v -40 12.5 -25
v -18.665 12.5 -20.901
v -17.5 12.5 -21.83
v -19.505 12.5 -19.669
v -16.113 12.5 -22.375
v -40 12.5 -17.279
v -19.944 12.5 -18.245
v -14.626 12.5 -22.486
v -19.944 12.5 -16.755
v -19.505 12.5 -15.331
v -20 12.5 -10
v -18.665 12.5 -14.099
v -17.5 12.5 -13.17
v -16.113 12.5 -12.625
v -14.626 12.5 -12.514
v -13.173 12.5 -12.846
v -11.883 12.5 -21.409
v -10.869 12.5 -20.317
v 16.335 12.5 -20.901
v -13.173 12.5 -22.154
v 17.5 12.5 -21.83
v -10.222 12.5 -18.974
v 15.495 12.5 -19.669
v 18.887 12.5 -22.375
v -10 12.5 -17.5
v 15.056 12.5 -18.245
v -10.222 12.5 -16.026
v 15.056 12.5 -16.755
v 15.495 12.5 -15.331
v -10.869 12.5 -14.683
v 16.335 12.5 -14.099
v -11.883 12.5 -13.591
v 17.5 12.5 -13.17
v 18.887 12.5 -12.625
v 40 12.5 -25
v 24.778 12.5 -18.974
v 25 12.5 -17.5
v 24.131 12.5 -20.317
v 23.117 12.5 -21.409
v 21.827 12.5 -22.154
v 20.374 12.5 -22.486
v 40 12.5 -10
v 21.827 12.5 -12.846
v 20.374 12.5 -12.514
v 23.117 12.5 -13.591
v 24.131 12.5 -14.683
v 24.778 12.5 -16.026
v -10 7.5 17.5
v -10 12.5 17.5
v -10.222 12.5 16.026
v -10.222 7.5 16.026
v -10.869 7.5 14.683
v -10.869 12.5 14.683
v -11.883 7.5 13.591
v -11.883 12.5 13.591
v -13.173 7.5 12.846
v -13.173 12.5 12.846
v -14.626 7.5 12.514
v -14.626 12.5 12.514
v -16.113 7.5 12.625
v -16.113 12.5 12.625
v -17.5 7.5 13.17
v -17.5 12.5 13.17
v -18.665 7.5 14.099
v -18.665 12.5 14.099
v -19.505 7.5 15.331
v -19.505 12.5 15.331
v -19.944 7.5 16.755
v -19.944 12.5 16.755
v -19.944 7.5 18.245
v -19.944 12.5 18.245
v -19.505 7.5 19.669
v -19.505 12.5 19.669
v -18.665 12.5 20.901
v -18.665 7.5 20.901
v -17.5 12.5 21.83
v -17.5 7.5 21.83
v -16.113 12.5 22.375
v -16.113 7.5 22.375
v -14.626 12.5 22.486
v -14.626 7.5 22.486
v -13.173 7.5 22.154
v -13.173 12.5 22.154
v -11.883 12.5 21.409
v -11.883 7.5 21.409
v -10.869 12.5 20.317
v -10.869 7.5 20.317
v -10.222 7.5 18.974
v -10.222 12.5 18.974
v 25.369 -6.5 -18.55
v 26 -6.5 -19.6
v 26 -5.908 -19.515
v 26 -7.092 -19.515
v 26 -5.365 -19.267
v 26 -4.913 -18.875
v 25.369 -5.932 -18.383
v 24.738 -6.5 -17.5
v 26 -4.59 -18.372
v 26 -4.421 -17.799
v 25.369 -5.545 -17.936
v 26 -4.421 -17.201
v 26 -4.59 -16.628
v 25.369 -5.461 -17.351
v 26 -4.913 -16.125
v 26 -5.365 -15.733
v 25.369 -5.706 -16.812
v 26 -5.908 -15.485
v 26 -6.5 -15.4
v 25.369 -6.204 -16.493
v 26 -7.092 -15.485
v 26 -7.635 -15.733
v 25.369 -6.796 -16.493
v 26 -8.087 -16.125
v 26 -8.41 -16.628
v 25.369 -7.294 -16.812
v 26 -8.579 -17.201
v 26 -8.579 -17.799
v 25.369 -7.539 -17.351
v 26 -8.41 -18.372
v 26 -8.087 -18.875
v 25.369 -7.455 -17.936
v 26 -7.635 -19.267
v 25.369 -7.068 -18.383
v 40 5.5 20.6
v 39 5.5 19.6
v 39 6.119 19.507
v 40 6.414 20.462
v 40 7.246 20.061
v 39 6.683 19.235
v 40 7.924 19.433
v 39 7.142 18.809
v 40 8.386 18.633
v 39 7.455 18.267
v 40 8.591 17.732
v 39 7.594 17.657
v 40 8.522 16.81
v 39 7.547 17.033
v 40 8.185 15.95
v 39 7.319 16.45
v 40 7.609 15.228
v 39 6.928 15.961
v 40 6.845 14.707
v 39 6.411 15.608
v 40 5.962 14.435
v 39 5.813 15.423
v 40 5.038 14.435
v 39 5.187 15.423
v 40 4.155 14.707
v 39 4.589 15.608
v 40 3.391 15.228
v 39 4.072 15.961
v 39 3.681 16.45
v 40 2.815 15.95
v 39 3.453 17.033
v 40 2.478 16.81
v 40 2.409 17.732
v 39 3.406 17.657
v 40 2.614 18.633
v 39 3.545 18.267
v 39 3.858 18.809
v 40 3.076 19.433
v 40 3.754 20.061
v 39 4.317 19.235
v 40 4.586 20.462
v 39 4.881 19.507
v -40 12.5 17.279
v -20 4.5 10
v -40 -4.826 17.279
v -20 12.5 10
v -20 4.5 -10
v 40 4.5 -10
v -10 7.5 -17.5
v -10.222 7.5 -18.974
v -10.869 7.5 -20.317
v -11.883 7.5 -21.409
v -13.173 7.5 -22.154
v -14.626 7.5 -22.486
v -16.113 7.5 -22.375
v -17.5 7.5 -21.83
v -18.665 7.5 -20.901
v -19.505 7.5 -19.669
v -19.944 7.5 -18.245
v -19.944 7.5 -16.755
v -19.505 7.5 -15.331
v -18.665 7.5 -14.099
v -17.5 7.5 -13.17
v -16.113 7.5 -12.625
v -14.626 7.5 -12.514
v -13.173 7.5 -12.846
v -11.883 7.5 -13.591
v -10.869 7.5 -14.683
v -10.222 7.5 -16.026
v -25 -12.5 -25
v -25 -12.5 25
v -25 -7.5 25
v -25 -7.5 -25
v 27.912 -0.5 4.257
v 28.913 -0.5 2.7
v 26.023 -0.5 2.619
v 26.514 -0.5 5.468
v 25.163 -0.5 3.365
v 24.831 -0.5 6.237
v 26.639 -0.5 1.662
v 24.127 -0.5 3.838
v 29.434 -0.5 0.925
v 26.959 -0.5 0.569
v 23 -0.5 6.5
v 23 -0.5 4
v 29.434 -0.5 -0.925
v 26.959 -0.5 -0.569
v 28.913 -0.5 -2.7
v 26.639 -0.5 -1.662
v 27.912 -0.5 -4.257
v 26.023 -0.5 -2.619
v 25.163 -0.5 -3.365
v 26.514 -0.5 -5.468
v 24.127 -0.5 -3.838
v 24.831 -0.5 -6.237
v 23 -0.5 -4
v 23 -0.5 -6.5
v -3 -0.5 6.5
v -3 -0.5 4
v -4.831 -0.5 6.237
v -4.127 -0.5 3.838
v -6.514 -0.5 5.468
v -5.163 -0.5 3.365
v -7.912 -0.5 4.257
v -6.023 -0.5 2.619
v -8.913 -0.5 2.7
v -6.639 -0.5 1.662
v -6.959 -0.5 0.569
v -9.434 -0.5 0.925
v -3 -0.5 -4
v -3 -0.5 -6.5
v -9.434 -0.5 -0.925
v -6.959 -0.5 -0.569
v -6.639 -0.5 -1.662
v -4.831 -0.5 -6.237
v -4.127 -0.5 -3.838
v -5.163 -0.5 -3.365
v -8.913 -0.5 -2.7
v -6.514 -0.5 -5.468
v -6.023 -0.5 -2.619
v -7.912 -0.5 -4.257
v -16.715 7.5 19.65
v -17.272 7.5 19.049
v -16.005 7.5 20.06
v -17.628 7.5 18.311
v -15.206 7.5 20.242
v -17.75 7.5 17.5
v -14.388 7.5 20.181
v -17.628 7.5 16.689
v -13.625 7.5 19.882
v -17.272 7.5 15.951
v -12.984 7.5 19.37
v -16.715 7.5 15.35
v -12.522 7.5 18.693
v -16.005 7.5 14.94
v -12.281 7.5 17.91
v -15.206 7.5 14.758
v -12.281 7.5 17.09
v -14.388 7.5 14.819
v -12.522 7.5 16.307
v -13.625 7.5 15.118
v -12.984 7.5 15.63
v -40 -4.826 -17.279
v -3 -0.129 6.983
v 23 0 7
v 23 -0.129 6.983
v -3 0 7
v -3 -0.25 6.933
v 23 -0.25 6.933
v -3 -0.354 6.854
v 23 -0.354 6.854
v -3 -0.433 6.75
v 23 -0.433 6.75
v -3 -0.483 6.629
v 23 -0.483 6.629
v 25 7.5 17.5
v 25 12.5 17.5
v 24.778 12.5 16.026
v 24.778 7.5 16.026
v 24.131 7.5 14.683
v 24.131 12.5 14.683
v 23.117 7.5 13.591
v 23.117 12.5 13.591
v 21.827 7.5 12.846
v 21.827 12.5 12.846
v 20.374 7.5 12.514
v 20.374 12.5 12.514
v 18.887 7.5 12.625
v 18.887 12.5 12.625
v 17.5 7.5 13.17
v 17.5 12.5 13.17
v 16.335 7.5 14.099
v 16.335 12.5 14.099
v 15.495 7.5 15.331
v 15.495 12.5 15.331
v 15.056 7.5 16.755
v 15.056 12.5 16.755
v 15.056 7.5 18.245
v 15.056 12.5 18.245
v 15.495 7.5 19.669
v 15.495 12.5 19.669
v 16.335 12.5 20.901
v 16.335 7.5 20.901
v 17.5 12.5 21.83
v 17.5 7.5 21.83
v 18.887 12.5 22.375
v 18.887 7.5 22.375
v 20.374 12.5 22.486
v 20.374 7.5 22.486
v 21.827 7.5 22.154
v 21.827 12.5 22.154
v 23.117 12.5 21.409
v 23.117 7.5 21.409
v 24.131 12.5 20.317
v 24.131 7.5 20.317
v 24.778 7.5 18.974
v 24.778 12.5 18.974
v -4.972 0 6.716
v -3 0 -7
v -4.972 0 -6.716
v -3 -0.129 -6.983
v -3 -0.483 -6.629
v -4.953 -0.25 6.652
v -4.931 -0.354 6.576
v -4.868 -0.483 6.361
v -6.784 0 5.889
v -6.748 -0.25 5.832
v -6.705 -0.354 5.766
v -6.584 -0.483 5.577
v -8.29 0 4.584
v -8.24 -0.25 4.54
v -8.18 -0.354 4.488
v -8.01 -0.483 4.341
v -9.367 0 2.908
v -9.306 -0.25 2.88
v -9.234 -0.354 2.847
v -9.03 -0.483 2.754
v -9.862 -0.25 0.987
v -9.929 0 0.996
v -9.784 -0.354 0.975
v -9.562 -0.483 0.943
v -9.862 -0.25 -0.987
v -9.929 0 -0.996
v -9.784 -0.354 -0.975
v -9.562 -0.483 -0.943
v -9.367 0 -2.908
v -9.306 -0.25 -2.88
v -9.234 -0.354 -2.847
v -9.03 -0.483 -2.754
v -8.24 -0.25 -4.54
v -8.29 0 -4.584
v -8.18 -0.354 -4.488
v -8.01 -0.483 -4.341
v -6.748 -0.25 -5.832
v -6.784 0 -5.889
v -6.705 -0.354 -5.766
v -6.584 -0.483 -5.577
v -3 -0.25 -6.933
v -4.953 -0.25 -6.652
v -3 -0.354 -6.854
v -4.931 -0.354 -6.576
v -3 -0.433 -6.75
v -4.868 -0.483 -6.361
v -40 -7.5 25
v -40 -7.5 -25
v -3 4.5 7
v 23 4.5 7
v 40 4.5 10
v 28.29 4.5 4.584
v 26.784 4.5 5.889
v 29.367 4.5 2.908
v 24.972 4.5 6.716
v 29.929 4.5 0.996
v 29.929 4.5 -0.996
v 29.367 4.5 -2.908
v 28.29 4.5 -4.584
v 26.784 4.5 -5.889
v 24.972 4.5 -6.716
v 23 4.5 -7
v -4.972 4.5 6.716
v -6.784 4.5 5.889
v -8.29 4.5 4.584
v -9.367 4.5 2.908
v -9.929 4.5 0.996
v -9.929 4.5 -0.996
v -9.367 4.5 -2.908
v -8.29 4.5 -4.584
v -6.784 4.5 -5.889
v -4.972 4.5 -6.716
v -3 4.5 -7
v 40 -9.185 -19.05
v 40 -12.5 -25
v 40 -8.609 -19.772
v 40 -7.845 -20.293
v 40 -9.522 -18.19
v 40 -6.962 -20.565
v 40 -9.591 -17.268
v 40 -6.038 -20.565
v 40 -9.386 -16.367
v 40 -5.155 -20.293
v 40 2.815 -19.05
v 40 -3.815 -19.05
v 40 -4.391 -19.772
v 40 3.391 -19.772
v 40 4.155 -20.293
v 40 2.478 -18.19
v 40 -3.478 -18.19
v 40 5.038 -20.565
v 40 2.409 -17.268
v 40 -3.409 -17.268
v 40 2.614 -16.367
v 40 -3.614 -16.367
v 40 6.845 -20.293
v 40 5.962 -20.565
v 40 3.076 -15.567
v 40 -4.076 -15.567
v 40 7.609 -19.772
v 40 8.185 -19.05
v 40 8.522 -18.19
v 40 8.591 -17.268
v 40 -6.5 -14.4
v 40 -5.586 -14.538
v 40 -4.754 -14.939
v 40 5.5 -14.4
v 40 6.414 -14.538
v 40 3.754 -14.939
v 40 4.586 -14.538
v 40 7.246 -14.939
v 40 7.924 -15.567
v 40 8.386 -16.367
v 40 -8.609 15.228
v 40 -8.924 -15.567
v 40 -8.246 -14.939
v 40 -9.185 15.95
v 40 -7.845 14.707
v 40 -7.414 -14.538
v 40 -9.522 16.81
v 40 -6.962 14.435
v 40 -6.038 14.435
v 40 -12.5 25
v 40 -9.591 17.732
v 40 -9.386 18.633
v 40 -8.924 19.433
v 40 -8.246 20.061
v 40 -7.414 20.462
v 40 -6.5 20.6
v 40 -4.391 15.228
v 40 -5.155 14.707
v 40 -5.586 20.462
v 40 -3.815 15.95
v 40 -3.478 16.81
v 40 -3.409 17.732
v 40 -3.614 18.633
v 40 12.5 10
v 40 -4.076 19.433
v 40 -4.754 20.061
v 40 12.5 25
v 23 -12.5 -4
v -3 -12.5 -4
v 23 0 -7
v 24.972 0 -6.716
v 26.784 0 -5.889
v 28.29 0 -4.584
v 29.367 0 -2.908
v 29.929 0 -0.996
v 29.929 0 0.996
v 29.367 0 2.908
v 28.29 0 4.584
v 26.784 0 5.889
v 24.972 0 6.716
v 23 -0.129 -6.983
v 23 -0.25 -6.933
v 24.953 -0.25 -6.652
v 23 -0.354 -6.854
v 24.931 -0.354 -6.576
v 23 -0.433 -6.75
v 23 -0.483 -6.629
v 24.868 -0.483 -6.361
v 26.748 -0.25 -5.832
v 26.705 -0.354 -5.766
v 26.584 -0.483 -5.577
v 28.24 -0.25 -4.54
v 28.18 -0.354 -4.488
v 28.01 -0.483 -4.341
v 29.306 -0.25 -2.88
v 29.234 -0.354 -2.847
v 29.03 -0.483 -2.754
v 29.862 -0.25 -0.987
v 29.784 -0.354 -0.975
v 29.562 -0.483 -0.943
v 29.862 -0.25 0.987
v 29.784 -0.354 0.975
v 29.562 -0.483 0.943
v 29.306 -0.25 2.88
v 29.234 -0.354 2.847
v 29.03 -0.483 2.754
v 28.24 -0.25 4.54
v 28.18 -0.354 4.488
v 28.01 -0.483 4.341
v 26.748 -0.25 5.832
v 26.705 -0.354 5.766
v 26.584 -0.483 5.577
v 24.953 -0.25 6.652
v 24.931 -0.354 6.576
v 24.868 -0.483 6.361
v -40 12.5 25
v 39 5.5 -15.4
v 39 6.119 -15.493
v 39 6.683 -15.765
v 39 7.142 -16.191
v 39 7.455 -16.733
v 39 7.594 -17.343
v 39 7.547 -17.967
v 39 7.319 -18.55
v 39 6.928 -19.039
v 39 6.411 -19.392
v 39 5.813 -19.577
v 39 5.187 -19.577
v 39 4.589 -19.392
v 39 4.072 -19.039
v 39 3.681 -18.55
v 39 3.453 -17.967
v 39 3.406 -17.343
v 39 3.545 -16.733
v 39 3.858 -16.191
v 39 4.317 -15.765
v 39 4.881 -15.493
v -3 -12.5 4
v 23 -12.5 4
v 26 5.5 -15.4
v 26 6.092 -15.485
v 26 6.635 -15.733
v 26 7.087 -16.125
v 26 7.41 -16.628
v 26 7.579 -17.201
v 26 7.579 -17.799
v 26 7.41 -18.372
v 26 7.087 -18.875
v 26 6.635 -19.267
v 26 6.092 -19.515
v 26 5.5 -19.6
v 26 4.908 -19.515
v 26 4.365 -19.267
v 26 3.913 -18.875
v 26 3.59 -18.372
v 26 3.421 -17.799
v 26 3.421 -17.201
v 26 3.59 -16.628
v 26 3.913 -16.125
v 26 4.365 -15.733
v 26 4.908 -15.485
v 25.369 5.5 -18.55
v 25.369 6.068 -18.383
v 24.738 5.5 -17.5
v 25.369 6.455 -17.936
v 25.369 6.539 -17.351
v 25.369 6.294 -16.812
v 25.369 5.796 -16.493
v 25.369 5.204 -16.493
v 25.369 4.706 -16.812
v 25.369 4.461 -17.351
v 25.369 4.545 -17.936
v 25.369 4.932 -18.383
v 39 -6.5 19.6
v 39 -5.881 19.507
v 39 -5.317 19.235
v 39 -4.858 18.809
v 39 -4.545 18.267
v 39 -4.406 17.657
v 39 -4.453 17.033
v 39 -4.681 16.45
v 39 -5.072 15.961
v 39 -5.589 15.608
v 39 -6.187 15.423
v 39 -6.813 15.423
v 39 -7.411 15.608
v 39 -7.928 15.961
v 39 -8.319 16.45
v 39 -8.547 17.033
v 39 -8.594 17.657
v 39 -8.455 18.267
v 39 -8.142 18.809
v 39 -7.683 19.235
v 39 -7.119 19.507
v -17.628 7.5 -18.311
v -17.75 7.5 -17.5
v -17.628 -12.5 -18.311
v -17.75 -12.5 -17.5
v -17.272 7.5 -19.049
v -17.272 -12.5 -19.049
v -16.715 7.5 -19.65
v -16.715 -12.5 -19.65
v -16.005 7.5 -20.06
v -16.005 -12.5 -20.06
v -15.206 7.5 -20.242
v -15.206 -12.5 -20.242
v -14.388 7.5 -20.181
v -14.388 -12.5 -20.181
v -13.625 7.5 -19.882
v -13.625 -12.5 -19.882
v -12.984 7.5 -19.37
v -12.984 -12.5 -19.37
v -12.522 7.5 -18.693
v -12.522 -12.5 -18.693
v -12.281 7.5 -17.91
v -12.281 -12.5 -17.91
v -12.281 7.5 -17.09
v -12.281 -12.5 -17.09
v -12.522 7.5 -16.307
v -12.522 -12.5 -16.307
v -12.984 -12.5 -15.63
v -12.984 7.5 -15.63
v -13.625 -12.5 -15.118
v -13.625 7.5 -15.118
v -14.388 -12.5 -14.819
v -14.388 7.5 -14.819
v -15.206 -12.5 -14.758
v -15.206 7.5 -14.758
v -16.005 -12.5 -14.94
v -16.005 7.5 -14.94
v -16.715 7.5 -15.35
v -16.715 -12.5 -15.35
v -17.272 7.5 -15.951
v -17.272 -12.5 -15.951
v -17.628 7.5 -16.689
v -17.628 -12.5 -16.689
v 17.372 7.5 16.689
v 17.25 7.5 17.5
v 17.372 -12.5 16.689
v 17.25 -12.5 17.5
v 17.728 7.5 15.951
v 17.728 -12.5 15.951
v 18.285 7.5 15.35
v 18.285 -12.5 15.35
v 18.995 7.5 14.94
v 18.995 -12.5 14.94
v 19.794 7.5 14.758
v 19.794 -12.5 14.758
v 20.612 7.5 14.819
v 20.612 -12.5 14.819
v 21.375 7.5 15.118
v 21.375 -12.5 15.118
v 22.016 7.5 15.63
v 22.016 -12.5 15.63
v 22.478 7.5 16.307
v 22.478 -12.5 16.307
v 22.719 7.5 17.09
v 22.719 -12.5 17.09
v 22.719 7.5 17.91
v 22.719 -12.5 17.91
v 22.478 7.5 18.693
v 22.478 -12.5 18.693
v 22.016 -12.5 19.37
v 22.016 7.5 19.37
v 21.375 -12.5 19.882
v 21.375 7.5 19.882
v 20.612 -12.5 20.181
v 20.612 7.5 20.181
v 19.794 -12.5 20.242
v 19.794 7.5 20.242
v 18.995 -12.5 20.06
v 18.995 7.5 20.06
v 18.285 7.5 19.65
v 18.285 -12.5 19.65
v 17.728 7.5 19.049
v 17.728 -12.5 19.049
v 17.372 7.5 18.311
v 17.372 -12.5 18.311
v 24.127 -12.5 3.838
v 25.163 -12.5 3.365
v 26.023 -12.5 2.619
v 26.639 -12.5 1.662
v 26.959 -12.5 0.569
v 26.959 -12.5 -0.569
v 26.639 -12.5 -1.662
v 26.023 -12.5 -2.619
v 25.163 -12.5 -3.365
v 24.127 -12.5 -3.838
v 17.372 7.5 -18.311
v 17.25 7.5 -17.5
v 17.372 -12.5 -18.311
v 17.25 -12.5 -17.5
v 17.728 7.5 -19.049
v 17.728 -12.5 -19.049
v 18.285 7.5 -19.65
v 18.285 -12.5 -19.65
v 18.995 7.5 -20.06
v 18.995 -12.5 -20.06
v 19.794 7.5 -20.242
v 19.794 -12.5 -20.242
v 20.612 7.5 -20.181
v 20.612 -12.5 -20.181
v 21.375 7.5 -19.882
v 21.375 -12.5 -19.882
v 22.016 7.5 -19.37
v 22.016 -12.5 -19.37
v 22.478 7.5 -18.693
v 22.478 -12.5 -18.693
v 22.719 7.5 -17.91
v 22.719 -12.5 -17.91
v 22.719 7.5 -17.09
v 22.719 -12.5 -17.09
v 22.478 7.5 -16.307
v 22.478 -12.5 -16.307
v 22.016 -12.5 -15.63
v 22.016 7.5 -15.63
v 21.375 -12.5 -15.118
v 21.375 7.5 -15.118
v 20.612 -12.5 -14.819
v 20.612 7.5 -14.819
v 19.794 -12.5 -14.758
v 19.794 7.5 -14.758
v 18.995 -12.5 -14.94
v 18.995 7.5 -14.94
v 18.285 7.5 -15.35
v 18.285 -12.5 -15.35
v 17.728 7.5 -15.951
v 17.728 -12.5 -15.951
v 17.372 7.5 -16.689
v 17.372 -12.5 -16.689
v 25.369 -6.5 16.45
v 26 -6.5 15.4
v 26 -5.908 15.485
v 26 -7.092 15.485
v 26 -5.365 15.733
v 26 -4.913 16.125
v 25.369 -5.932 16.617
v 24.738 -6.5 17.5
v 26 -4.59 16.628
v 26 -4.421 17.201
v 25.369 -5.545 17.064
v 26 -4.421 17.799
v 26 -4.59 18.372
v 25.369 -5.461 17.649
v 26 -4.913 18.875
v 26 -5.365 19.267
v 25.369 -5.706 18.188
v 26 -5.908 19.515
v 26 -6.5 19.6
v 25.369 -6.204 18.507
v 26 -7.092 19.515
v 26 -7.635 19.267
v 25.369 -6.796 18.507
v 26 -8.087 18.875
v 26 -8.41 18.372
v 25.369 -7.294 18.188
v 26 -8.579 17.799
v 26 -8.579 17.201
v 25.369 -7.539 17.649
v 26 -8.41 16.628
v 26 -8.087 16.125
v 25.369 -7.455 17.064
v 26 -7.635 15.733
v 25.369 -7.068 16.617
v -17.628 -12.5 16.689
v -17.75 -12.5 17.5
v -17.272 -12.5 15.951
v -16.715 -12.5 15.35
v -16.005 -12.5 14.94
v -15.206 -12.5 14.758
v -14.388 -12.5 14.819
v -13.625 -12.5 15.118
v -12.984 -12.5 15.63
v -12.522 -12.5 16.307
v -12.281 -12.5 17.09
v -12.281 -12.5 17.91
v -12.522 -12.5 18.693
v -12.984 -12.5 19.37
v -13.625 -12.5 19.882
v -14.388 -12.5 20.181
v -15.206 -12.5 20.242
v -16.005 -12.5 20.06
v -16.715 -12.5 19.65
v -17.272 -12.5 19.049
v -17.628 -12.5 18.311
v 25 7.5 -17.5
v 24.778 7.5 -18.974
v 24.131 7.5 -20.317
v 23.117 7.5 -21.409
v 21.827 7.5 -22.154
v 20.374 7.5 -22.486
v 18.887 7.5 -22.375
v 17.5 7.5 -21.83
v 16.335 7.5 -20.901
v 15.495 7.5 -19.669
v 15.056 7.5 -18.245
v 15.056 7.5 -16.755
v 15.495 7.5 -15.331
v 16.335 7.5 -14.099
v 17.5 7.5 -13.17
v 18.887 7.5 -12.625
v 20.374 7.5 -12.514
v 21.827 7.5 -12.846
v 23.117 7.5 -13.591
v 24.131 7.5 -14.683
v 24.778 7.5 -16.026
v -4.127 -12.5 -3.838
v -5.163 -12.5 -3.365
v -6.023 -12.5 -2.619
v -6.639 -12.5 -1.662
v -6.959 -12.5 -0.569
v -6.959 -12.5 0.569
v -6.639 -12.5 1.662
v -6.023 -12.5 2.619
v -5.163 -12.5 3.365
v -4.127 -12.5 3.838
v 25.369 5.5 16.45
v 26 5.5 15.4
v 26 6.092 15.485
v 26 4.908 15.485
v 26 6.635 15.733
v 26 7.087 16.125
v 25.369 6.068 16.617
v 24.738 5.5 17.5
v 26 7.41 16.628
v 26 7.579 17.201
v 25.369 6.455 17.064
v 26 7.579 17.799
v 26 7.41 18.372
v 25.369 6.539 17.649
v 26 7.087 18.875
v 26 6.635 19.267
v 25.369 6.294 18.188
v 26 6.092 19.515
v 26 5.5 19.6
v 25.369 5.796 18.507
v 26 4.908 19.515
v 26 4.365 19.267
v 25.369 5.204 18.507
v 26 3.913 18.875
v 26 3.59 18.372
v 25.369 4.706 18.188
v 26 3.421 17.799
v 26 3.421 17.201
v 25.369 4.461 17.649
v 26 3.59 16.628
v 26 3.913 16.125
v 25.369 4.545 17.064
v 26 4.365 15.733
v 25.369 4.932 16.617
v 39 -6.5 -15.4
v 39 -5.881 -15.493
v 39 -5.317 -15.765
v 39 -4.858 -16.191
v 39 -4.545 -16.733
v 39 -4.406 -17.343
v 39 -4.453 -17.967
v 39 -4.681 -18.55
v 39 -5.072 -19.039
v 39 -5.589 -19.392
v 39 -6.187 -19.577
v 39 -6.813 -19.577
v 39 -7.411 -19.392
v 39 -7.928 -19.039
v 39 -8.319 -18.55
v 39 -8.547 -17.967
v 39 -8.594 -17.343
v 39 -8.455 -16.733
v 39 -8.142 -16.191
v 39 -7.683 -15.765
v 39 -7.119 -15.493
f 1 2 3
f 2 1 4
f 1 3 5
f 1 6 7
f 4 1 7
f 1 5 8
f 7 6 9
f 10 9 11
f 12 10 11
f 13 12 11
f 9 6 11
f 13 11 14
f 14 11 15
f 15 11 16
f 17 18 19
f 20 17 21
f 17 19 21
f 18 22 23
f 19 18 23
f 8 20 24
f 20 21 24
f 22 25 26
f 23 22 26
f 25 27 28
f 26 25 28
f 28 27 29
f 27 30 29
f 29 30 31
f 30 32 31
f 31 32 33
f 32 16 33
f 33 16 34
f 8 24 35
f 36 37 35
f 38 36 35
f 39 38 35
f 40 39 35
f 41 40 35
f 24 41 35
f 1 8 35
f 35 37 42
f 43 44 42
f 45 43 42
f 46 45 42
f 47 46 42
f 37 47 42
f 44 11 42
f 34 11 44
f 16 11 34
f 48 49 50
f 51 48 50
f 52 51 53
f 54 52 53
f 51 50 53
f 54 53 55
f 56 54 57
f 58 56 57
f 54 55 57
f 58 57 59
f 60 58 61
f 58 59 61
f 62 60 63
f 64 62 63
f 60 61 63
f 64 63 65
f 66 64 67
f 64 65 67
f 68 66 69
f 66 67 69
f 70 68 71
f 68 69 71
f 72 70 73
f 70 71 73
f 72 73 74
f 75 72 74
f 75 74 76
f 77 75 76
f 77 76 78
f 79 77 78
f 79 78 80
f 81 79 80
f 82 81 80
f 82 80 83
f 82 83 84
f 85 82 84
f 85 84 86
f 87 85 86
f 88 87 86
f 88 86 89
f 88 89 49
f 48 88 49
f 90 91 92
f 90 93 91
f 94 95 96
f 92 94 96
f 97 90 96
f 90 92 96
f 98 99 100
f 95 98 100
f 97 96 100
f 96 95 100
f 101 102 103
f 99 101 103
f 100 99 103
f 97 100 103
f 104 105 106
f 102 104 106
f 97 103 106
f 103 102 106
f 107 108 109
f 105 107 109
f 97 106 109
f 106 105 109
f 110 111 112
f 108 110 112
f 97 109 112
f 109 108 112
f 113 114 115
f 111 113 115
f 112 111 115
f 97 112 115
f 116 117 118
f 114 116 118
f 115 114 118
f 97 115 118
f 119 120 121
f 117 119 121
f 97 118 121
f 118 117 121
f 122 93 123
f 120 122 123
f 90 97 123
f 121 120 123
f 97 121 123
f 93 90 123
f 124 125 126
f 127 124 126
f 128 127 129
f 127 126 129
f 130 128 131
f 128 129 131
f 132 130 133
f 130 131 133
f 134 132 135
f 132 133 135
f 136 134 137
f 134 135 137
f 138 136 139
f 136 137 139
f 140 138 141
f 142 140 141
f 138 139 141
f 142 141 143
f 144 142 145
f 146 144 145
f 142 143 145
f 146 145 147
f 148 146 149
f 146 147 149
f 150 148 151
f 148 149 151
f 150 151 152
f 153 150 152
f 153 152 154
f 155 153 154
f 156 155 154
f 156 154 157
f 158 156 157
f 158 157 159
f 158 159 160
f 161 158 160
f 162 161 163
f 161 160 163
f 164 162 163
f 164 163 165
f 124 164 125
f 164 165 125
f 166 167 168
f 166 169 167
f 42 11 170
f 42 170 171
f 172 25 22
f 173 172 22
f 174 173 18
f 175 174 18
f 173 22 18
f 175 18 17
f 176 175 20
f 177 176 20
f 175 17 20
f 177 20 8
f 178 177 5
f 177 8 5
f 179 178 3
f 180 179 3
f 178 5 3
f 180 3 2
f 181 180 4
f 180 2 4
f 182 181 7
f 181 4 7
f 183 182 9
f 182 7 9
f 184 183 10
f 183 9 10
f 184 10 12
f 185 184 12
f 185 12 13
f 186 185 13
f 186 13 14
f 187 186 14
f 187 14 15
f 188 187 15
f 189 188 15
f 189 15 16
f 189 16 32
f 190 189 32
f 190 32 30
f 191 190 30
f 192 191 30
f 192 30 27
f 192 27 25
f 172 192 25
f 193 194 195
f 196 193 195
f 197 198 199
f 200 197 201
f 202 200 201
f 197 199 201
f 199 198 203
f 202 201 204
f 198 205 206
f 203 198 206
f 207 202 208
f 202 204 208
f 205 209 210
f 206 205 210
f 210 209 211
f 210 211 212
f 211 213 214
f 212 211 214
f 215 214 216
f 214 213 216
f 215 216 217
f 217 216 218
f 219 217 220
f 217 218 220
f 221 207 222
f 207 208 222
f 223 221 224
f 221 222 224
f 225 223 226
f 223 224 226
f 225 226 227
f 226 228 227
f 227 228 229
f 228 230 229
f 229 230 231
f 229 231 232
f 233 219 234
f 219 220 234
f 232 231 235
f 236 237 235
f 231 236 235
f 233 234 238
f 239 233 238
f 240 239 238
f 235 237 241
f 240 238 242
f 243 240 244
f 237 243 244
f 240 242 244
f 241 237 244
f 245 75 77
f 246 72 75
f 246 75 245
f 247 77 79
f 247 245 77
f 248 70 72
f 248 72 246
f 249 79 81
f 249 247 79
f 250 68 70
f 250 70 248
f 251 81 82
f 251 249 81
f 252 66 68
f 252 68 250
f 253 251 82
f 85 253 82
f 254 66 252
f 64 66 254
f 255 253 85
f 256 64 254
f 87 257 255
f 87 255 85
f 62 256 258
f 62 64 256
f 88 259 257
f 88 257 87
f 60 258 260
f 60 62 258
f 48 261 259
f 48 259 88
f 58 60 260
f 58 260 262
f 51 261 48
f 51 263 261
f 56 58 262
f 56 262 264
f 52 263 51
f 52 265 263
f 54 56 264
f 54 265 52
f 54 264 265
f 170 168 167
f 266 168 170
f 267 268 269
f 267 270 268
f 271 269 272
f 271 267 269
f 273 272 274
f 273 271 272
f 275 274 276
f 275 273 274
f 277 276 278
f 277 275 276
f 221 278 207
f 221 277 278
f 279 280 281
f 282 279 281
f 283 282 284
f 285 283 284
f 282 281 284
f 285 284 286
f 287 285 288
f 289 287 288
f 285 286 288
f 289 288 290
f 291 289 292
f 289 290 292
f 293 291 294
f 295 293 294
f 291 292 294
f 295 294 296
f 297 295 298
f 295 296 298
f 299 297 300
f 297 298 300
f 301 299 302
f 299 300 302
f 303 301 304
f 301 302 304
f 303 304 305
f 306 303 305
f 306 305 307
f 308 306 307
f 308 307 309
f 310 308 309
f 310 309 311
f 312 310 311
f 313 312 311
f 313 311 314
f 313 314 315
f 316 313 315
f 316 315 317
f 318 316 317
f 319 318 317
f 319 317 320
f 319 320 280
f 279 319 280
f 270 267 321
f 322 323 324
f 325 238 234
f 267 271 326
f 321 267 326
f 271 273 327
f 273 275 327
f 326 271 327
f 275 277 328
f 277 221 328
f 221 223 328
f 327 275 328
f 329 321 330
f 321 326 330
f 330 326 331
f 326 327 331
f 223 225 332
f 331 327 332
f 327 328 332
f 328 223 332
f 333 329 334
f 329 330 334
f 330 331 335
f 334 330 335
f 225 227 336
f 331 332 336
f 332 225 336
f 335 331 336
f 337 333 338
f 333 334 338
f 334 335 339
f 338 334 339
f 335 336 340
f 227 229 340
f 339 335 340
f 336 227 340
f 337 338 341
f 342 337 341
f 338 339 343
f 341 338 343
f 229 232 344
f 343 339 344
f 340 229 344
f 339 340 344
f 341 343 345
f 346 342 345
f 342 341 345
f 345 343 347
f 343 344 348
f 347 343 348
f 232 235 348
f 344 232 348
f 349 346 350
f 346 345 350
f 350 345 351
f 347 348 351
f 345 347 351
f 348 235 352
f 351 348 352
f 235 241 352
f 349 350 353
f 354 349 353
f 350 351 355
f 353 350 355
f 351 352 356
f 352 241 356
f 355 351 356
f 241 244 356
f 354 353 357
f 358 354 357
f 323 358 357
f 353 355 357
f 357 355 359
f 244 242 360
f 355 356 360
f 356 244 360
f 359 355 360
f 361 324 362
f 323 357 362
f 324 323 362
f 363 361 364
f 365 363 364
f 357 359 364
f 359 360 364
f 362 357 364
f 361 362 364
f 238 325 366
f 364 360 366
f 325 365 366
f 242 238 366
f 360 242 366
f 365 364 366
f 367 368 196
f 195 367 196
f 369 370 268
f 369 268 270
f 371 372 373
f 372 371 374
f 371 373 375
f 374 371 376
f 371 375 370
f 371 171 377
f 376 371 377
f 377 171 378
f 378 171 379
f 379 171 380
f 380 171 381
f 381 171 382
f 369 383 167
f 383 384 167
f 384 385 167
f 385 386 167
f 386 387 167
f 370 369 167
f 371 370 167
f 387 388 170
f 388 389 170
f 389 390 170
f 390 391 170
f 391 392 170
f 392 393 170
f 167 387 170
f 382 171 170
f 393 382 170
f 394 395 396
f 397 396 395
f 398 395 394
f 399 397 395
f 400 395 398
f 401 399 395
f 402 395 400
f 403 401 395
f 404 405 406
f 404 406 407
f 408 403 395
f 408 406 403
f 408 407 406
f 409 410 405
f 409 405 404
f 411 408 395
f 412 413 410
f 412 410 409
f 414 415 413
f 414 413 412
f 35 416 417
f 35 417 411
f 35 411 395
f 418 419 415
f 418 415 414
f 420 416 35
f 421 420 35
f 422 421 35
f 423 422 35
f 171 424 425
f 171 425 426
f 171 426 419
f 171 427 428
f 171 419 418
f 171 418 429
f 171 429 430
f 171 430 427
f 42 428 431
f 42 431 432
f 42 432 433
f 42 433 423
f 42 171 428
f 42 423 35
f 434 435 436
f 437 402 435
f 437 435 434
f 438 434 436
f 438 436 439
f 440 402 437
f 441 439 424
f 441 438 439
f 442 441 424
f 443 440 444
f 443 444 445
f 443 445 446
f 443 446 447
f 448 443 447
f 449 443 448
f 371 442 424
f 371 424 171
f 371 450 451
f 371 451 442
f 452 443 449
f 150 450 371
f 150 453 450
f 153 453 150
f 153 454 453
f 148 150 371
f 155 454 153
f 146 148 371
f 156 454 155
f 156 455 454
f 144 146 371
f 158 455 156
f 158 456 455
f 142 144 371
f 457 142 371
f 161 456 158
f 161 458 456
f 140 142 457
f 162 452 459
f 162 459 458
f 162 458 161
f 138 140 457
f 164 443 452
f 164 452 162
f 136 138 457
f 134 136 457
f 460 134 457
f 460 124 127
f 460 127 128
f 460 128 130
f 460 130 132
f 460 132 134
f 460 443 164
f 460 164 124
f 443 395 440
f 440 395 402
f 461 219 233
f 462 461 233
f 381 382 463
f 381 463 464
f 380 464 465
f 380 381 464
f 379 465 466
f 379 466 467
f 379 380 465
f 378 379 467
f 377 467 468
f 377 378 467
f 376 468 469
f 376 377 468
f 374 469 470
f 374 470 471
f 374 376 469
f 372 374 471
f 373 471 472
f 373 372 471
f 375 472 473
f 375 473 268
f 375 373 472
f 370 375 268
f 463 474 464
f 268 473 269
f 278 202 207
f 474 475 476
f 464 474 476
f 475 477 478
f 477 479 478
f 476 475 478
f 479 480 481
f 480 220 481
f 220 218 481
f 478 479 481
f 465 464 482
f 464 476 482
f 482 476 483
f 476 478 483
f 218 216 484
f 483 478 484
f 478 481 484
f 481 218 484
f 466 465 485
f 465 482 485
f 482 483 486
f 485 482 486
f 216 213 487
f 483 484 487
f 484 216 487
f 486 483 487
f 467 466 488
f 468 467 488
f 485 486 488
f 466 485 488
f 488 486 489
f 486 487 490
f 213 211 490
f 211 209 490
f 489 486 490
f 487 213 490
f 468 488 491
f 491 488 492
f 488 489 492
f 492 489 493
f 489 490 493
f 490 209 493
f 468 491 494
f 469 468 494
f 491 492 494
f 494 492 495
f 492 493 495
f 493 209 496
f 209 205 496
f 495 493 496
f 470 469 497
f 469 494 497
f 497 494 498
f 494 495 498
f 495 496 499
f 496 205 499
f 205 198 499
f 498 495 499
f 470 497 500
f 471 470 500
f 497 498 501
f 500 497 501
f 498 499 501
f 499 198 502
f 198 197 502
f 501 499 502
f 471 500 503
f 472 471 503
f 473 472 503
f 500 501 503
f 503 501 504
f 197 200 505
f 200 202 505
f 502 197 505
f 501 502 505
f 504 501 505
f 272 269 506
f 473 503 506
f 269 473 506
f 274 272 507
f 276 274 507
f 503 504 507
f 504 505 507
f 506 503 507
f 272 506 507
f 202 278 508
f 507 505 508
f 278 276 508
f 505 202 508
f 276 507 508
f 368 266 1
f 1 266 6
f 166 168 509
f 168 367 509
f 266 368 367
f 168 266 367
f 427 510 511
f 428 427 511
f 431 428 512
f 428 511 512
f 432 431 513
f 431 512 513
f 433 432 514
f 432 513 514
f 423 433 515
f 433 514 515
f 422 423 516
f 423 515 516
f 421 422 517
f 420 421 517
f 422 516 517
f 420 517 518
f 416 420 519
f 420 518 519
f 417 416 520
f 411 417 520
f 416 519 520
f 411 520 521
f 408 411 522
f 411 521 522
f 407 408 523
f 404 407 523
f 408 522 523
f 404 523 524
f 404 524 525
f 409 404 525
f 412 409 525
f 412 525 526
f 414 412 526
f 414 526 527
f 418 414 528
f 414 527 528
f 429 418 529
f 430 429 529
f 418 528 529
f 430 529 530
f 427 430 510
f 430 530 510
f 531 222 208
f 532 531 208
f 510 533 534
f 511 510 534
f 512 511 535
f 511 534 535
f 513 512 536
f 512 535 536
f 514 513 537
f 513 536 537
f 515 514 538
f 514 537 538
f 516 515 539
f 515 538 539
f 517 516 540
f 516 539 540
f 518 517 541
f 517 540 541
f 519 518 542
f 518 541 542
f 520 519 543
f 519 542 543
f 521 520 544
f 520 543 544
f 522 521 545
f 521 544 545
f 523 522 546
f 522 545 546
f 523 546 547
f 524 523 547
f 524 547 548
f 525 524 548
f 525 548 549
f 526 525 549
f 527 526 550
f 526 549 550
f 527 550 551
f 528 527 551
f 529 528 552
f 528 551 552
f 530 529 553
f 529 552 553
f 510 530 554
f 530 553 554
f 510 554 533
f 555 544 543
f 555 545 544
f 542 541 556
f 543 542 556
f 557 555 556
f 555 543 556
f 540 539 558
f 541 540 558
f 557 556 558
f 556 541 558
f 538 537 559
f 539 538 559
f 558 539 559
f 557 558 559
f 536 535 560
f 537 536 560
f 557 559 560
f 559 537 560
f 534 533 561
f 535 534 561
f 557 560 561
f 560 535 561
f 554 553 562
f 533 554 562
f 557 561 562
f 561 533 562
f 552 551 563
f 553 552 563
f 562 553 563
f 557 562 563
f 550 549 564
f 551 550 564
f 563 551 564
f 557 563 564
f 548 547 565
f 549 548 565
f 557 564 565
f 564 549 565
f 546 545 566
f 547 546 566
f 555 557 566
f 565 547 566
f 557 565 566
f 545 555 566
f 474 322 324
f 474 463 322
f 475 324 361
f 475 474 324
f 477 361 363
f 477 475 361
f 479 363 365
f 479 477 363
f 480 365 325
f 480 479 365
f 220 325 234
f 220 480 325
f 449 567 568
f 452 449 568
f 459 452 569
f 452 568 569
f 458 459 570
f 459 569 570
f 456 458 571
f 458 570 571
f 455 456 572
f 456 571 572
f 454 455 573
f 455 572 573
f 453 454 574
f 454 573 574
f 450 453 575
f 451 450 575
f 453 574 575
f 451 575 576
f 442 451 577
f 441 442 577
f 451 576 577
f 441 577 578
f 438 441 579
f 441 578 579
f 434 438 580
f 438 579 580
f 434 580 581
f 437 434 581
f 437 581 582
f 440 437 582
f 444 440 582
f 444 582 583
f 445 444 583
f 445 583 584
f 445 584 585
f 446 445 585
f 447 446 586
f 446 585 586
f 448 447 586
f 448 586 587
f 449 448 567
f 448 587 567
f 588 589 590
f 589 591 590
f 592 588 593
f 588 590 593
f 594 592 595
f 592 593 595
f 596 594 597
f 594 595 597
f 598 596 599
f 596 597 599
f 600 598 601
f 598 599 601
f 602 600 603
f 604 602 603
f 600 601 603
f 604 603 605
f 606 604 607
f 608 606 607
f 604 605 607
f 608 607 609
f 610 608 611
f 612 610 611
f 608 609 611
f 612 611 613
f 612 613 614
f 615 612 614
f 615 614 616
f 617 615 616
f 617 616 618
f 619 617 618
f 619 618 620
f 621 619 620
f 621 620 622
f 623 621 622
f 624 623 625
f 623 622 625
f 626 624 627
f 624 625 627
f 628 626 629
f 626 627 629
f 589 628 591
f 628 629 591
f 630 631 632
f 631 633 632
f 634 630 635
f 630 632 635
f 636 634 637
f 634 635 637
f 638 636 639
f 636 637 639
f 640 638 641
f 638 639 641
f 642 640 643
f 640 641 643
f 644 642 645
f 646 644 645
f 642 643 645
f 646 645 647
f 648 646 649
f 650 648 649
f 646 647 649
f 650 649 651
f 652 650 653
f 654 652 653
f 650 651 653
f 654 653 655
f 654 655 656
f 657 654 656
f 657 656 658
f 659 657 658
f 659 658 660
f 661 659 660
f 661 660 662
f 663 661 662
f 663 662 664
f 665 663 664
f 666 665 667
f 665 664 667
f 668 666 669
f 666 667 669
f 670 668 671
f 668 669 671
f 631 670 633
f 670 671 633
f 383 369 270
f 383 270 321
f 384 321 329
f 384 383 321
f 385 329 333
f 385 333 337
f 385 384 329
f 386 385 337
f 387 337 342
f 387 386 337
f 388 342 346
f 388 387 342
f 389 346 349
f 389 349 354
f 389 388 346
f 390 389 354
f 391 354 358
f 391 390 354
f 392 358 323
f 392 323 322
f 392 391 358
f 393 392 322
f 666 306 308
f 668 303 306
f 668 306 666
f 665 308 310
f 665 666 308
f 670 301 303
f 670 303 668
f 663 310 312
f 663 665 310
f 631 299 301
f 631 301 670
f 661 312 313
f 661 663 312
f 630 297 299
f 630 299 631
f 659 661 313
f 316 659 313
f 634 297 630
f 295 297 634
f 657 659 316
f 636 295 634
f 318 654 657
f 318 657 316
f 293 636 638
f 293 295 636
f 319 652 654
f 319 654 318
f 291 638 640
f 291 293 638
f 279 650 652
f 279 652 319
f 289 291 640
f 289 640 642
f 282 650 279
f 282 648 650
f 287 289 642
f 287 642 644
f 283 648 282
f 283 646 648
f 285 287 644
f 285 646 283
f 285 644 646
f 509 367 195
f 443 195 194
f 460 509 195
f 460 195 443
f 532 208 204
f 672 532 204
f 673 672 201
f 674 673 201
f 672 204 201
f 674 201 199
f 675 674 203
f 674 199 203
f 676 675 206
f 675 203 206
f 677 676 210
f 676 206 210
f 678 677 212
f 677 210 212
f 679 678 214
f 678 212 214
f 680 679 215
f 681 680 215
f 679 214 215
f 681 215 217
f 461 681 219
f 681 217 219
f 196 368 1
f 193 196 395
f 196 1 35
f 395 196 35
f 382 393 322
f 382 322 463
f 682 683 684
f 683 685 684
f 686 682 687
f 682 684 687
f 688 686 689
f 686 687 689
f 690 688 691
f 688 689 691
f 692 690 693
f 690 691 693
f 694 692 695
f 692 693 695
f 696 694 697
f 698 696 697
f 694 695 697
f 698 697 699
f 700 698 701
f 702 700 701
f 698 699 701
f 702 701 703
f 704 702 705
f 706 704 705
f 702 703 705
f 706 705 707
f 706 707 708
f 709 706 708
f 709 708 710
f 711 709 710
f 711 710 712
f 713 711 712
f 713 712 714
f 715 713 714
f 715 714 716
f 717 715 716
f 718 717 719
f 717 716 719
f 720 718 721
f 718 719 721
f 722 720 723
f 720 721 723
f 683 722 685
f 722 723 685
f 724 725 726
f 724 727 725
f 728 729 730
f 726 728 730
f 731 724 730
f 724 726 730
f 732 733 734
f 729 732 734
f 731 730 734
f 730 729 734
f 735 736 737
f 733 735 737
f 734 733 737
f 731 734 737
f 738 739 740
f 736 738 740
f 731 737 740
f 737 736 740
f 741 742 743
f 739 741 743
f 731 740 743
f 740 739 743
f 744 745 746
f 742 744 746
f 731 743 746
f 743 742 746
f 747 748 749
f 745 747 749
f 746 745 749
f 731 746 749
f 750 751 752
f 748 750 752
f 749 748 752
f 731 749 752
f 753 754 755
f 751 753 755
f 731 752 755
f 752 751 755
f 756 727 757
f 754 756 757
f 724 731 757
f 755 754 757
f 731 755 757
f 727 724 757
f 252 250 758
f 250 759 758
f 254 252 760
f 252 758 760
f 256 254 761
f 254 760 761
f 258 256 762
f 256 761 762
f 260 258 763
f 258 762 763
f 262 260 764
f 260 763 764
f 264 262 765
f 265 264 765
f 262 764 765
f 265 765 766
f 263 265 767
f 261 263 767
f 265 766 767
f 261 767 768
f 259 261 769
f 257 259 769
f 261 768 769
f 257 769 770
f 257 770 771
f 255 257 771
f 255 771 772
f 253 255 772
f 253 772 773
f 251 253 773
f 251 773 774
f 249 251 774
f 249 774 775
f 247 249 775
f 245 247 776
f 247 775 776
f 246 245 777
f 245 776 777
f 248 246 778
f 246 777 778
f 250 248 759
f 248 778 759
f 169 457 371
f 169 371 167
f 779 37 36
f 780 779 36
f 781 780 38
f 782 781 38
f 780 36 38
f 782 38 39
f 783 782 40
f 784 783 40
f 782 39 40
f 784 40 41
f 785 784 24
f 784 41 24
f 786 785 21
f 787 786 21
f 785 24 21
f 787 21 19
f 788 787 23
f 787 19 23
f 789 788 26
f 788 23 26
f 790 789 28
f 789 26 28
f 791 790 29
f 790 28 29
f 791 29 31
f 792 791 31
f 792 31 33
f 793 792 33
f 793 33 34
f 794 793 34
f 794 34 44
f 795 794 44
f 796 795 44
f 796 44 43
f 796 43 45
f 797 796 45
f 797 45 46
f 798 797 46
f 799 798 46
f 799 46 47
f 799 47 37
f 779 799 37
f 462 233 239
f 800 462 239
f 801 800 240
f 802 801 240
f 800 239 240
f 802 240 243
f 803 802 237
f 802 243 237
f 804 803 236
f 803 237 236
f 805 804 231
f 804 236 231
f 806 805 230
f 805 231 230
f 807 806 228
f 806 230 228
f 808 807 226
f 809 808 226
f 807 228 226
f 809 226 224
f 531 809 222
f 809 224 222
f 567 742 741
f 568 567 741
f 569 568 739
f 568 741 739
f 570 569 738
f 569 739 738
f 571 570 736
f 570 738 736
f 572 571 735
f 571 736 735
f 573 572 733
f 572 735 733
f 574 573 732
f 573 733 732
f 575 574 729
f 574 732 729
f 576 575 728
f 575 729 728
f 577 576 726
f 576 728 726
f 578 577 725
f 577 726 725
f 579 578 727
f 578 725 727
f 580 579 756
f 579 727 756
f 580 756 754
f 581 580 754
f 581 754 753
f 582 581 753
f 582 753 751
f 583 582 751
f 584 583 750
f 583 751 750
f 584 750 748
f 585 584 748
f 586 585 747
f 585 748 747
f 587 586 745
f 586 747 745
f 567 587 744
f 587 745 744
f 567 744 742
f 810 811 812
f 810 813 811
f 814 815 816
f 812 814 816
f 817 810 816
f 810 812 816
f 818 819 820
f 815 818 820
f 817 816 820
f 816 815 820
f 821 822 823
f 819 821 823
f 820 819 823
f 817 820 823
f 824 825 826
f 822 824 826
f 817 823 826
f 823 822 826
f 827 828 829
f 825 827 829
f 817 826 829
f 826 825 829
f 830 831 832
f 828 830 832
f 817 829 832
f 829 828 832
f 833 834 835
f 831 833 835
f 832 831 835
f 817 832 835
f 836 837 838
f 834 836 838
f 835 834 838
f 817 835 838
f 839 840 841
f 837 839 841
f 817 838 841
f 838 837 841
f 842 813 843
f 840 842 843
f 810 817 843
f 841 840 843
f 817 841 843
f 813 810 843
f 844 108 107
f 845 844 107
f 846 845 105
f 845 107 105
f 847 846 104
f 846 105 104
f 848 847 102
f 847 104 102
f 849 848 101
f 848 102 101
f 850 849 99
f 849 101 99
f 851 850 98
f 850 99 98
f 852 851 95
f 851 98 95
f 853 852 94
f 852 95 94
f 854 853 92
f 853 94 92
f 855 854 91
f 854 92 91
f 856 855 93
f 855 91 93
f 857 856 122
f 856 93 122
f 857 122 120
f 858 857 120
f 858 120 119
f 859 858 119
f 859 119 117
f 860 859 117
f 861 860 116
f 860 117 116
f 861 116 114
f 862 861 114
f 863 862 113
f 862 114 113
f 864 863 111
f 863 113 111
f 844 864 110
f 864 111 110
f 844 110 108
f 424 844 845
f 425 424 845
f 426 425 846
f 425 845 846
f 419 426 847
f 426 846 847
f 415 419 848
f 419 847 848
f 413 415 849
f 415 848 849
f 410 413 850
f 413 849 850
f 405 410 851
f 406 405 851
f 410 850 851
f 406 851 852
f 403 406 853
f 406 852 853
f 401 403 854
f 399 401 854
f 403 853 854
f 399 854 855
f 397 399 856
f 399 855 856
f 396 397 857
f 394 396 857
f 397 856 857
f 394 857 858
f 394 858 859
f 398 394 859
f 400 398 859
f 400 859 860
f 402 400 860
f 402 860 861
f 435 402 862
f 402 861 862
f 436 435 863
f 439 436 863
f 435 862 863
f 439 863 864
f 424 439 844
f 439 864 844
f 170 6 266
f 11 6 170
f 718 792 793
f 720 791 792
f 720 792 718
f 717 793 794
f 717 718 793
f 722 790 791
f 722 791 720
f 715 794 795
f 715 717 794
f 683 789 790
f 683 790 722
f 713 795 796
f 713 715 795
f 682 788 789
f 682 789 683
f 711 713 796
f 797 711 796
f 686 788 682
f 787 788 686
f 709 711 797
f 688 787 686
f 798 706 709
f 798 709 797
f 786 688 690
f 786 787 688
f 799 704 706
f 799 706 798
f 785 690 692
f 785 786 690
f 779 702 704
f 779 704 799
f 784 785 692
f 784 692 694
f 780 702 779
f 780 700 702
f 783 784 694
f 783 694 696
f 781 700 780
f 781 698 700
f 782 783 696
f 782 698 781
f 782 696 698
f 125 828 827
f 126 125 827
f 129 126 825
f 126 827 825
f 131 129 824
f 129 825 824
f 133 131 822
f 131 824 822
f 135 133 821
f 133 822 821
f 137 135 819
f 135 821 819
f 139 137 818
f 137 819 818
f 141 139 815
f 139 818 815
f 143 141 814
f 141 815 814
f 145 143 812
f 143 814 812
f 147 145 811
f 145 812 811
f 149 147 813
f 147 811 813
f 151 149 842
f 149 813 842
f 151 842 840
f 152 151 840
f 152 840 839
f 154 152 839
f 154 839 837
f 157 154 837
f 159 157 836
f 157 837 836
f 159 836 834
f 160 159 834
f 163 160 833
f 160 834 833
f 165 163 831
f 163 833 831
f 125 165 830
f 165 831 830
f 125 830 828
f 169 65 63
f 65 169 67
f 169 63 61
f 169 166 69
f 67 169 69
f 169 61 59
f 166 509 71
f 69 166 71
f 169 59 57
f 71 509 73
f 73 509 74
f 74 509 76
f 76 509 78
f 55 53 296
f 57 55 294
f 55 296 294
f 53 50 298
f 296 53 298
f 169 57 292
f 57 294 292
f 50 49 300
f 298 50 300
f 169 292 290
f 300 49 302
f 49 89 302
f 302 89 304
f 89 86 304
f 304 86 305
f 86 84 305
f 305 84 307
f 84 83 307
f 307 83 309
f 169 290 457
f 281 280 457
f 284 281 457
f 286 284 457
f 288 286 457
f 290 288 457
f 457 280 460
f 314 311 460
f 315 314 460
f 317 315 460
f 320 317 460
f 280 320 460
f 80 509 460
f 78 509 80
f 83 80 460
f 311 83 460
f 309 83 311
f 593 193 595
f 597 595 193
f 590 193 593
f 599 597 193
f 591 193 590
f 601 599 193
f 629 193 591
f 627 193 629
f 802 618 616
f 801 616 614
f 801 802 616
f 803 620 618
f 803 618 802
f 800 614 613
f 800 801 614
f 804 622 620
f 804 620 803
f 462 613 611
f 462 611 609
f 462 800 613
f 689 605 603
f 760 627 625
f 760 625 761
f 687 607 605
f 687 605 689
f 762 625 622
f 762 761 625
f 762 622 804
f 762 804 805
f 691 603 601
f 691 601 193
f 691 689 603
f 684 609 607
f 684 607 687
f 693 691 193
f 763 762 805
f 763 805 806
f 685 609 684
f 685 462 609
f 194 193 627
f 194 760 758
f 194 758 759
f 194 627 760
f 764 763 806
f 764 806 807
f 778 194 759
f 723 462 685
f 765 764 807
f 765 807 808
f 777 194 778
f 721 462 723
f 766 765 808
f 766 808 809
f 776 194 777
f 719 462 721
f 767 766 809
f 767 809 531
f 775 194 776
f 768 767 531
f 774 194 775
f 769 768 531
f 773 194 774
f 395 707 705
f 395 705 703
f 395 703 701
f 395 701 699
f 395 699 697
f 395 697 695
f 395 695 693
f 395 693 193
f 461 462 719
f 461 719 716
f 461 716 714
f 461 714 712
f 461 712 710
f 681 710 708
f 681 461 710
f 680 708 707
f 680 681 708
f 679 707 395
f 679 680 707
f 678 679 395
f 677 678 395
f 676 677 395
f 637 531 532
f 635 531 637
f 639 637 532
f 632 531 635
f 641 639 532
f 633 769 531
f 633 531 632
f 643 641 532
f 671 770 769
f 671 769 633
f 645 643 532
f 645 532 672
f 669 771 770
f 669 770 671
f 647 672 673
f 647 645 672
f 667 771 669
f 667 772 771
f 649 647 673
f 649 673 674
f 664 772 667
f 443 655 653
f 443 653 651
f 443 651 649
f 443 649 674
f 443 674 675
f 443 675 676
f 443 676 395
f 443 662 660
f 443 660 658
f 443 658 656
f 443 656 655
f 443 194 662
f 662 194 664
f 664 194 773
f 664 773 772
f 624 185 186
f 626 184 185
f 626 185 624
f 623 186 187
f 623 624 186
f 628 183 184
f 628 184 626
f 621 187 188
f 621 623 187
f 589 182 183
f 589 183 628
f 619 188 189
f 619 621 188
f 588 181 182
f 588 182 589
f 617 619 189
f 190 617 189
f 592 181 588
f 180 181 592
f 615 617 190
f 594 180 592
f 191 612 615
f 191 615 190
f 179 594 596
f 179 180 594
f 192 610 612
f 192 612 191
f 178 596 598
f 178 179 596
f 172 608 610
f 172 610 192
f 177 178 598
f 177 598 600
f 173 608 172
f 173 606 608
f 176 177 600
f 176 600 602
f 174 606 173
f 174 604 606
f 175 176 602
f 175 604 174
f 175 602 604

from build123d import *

# Parameters (mm, degrees)
SKICA1_W                 = 80
SKICA1_H                 = 25
P_IDAT_VYSUNUT_M1_DEPTH  = 25
SKICA2_W                 = 15
SKICA2_H                 = 5
ODEBRAT_VYSUNUT_M1_DEPTH = 51
ODEBRAT_VYSUNUT_M2_DEPTH = 8
ZKOSEN_1_SIZE            = 20
ZKOSEN_1_SIZE2           = 9.326153163
ODEBRAT_VYSUNUT_M3_DEPTH = 5
ODEBRAT_VYSUNUT_M4_DEPTH = 13
D_RA1_D                  = 5.5
D_RA1_DEPTH              = 25
D_RA1_CBORE_D            = 10
D_RA1_CBORE_DEPTH        = 5
D_RA1_TIP                = 1.652366702
M5_Z_VIT1_D              = 4.2
M5_Z_VIT1_DEPTH          = 14
M5_Z_VIT1_TIP            = 1.2618073
ZKOSEN_2_SIZE            = 1
ZAOBLIT1_R               = 0.5


with BuildPart() as part:
    # Skica1 → Přidat vysunutím1 (new body, symmetric)
    with BuildSketch(Plane.XY):
        Rectangle(SKICA1_W, SKICA1_H)
    extrude(amount=P_IDAT_VYSUNUT_M1_DEPTH, both=True)

    # Skica2 → Odebrat vysunutím1 (cut, through all)
    with BuildSketch(Plane.XY.offset(25)):
        with Locations((-32.5, -10)):
            Rectangle(SKICA2_W, SKICA2_H)
    extrude(amount=-ODEBRAT_VYSUNUT_M1_DEPTH, mode=Mode.SUBTRACT)

    # Skica3 → Odebrat vysunutím2 (cut)
    with BuildSketch(Plane(origin=(0, 12.5, 0), x_dir=(1, 0, 0), z_dir=(0, 1, 0))):
        Polygon((-40, 17.279404685), (-20, 10), (40, 10), (40, -10), (-20, -10), (-40, -17.279404685), align=None)
    extrude(amount=-ODEBRAT_VYSUNUT_M2_DEPTH, mode=Mode.SUBTRACT)

    # Zkosení1
    zkosen_1_edges = [part.edges().sort_by_distance(p)[0] for p in [
        (-40, 4.5, 0),
    ]]
    zkosen_1_side = [part.faces().sort_by_distance(p)[0] for p in [
        (-2.780115466, 4.5, 0),
    ]]
    chamfer(zkosen_1_edges, length=ZKOSEN_1_SIZE, length2=ZKOSEN_1_SIZE2, reference=zkosen_1_side[0])

    # Skica4 → Odebrat vysunutím3 (cut)
    with BuildSketch(Plane(origin=(0, 4.5, 0), x_dir=(1, 0, 0), z_dir=(0, 1, 0))):
        with BuildLine():
            Line((-3, 7), (23, 7))
            ThreePointArc((23, 7), (30, 0), (23, -7))
            Line((23, -7), (-3, -7))
            ThreePointArc((-3, -7), (-10, 0), (-3, 7))
        make_face()
    extrude(amount=-ODEBRAT_VYSUNUT_M3_DEPTH, mode=Mode.SUBTRACT)

    # Skica5 → Odebrat vysunutím4 (cut, through all)
    with BuildSketch(Plane(origin=(0, -0.5, 0), x_dir=(1, 0, 0), z_dir=(0, 1, 0))):
        with BuildLine():
            Line((-3, -4), (23, -4))
            ThreePointArc((23, -4), (27, 0), (23, 4))
            Line((23, 4), (-3, 4))
            ThreePointArc((-3, 4), (-7, 0), (-3, -4))
        make_face()
    extrude(amount=-ODEBRAT_VYSUNUT_M4_DEPTH, mode=Mode.SUBTRACT)

    # Díra1
    with Locations(Plane(origin=(0, 12.5, 0), x_dir=(1, 0, 0), z_dir=(0, 1, 0))):
        with Locations((-15, 17.5), (20, 17.5), (20, -17.5), (-15, -17.5)):
            CounterBoreHole(D_RA1_D / 2, D_RA1_CBORE_D / 2, D_RA1_CBORE_DEPTH, depth=D_RA1_DEPTH)
            with Locations((0, 0, -(D_RA1_DEPTH + D_RA1_TIP / 2))):  # 118° drill point
                Cone(0, D_RA1_D / 2, D_RA1_TIP, mode=Mode.SUBTRACT)

    # M5 závit1
    with Locations(Plane(origin=(40, 0, 0), x_dir=(0, 0, -1), z_dir=(1, 0, 0))):
        with Locations((-17.5, 5.5), (-17.5, -6.5), (17.5, 5.5), (17.5, -6.5)):
            Hole(M5_Z_VIT1_D / 2, depth=M5_Z_VIT1_DEPTH)
            with Locations((0, 0, -(M5_Z_VIT1_DEPTH + M5_Z_VIT1_TIP / 2))):  # 118° drill point
                Cone(0, M5_Z_VIT1_D / 2, M5_Z_VIT1_TIP, mode=Mode.SUBTRACT)

    # Zkosení2
    zkosen_2_edges = [part.edges().sort_by_distance(p)[0] for p in [
        (40, -6.5, -19.6),
        (40, 5.5, -19.6),
        (40, -6.5, 15.4),
        (40, 5.5, 15.4),
    ]]
    chamfer(zkosen_2_edges, length=ZKOSEN_2_SIZE)

    # Zaoblit1
    zaoblit1_edges = [part.edges().sort_by_distance(p)[0] for p in [
        (-10, -0.5, 0),
        (10, -0.5, -7),
        (30, -0.5, 0),
        (10, -0.5, 7),
    ]]
    fillet(zaoblit1_edges, radius=ZAOBLIT1_R)


solid = part.part
